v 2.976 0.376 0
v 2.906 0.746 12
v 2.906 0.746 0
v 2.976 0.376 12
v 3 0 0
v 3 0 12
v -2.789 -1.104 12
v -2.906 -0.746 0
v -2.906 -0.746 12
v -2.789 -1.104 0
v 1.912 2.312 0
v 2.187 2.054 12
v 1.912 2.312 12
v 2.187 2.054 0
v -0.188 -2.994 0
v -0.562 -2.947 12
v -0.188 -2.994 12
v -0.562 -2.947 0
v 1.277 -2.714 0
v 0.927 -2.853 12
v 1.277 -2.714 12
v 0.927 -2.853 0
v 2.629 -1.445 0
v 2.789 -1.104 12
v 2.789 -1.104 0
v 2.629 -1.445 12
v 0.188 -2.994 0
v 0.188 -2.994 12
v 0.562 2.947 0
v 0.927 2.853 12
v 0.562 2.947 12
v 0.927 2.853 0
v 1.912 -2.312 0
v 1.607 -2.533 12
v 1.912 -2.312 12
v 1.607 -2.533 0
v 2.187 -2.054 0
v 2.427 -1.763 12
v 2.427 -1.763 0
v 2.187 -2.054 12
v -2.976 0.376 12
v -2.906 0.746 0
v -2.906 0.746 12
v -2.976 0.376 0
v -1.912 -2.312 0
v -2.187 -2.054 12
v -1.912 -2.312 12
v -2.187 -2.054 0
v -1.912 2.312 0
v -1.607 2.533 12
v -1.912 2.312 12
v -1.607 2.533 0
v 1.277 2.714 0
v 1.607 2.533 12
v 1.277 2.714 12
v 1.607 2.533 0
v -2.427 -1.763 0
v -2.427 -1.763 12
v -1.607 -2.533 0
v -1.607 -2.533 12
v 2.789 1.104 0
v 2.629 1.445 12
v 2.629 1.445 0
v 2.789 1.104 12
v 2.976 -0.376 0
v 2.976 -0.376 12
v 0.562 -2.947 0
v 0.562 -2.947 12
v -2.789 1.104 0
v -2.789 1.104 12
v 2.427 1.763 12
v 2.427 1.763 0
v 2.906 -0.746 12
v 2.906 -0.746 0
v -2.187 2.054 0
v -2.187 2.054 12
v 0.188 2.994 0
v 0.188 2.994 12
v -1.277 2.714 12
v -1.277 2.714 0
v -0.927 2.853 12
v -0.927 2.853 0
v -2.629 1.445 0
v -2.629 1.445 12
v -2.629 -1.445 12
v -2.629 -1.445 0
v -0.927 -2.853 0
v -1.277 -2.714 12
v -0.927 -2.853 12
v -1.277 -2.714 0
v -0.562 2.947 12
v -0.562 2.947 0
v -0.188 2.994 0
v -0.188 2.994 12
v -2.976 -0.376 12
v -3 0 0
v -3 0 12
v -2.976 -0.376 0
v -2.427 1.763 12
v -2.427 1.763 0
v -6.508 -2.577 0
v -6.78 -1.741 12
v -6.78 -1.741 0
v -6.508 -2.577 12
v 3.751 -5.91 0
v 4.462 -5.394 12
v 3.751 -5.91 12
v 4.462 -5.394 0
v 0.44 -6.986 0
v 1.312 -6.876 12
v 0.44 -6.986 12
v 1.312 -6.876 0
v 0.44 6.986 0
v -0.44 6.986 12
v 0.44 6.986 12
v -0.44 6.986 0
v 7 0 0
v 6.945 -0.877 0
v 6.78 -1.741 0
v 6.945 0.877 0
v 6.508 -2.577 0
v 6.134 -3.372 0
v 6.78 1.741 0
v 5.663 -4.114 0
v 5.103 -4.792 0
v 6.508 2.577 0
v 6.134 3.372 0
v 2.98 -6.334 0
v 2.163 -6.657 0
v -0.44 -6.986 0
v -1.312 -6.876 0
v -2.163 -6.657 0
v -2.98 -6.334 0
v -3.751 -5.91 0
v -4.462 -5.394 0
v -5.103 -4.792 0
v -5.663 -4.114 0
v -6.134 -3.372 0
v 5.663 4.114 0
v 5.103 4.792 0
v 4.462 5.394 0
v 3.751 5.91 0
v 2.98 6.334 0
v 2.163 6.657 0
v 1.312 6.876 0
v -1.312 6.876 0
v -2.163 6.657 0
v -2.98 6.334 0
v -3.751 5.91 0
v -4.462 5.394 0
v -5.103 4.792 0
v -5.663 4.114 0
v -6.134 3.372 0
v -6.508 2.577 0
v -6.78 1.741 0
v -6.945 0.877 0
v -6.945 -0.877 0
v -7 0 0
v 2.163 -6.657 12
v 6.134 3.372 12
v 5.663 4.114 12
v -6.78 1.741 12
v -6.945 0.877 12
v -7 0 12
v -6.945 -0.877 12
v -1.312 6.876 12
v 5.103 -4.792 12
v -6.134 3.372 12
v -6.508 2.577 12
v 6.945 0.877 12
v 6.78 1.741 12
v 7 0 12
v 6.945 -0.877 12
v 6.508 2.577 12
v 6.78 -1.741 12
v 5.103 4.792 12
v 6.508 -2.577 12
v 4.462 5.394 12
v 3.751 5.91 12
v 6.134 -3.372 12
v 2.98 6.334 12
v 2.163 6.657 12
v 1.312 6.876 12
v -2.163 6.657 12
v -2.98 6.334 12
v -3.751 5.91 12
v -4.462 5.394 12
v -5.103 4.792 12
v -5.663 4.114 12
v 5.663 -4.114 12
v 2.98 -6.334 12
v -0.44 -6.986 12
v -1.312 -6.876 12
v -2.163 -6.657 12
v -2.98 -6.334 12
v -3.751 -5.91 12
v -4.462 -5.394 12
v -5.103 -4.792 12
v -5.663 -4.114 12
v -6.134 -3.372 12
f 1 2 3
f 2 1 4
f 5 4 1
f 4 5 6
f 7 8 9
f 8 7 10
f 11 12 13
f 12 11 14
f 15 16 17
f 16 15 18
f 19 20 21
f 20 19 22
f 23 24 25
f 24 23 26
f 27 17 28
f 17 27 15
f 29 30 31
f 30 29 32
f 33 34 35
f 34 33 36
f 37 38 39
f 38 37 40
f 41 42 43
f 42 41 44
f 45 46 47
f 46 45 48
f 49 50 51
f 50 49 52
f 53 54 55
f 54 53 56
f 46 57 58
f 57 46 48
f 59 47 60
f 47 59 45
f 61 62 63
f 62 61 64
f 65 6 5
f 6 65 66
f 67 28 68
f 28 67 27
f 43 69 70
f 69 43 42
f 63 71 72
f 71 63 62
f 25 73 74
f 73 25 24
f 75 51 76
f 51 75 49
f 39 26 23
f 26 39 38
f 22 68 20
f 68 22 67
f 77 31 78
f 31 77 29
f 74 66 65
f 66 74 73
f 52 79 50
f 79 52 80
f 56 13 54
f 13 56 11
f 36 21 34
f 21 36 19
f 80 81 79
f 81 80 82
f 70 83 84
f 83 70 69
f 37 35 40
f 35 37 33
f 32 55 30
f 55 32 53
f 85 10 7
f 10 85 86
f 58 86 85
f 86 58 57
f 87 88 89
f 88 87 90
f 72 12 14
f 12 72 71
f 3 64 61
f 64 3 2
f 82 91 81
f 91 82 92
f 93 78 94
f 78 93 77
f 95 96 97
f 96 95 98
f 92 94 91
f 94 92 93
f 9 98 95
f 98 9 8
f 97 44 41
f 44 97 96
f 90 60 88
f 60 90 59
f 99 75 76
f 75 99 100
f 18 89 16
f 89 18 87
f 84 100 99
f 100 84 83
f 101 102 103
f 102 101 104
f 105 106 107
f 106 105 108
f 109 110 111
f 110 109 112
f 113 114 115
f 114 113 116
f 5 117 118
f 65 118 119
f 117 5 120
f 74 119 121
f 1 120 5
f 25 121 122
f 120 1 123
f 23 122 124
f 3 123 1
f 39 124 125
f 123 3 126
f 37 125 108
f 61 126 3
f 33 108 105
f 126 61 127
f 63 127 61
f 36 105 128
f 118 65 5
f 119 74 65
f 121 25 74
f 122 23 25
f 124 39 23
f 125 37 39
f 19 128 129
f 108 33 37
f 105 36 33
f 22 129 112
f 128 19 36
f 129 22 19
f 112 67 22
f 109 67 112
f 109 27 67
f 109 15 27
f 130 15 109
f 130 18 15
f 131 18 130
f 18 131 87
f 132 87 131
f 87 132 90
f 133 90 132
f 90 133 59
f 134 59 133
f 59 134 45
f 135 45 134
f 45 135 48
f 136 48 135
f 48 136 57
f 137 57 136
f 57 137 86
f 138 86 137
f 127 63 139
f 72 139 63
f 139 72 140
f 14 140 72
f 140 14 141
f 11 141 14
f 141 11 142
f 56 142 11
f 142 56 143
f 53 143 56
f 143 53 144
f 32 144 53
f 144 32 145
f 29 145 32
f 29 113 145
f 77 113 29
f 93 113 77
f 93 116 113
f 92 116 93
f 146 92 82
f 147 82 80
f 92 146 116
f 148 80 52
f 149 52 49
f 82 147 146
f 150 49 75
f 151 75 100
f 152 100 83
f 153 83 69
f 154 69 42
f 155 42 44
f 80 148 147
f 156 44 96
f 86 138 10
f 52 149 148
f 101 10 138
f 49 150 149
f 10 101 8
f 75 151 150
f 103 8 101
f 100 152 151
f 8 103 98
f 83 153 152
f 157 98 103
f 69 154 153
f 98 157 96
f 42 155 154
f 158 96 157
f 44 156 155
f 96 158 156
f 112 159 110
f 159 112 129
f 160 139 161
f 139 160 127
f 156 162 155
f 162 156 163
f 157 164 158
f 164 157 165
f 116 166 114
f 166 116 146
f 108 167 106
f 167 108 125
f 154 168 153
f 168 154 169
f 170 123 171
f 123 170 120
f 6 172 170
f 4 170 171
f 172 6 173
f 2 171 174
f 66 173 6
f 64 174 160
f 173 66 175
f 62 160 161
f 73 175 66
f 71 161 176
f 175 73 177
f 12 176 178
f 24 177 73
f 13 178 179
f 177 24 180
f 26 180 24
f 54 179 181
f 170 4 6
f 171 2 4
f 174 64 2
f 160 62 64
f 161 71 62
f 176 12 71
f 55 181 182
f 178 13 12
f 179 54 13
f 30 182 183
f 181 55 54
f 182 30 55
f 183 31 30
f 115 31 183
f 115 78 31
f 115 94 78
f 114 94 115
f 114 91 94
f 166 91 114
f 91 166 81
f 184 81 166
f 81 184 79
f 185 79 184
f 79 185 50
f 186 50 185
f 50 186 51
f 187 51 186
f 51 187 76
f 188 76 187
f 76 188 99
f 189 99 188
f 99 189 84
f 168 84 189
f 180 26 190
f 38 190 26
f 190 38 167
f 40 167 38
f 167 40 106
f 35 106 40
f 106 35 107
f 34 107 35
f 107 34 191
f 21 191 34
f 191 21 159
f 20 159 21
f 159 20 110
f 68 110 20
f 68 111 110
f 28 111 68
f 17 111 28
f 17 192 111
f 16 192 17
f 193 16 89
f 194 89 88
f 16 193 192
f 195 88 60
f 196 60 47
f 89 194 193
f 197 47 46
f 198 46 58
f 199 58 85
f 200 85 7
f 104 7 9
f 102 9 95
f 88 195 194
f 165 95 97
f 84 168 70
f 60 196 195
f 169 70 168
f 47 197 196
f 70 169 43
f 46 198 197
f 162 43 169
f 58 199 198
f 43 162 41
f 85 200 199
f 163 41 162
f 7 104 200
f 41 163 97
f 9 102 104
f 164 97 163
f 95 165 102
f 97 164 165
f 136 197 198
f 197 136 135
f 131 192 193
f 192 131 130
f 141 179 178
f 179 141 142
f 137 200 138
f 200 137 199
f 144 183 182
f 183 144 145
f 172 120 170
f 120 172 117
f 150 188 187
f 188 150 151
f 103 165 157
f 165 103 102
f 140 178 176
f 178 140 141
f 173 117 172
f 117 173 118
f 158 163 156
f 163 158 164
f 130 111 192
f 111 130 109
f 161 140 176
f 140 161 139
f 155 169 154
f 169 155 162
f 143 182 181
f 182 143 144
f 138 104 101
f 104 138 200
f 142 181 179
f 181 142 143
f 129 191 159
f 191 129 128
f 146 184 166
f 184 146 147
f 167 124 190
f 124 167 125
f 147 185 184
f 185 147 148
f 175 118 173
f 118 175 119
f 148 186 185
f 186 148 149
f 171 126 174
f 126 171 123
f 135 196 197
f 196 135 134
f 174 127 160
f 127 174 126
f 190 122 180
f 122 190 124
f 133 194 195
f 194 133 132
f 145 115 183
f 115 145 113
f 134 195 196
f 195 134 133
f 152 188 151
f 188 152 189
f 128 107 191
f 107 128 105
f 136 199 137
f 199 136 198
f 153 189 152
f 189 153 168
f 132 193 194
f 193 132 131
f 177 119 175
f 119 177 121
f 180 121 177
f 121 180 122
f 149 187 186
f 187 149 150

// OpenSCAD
$fn = 50;


difference() {
	union() {
		cylinder(h = 12, r = 7.0000000000);
	}
	union() {
		translate(v = [0, 0, -100]) {
			cylinder(h = 200, r = 3.0000000000);
		}
		translate(v = [0, 0, -100]) {
			cylinder(h = 200, r = 1.5000000000);
		}
	}
}
